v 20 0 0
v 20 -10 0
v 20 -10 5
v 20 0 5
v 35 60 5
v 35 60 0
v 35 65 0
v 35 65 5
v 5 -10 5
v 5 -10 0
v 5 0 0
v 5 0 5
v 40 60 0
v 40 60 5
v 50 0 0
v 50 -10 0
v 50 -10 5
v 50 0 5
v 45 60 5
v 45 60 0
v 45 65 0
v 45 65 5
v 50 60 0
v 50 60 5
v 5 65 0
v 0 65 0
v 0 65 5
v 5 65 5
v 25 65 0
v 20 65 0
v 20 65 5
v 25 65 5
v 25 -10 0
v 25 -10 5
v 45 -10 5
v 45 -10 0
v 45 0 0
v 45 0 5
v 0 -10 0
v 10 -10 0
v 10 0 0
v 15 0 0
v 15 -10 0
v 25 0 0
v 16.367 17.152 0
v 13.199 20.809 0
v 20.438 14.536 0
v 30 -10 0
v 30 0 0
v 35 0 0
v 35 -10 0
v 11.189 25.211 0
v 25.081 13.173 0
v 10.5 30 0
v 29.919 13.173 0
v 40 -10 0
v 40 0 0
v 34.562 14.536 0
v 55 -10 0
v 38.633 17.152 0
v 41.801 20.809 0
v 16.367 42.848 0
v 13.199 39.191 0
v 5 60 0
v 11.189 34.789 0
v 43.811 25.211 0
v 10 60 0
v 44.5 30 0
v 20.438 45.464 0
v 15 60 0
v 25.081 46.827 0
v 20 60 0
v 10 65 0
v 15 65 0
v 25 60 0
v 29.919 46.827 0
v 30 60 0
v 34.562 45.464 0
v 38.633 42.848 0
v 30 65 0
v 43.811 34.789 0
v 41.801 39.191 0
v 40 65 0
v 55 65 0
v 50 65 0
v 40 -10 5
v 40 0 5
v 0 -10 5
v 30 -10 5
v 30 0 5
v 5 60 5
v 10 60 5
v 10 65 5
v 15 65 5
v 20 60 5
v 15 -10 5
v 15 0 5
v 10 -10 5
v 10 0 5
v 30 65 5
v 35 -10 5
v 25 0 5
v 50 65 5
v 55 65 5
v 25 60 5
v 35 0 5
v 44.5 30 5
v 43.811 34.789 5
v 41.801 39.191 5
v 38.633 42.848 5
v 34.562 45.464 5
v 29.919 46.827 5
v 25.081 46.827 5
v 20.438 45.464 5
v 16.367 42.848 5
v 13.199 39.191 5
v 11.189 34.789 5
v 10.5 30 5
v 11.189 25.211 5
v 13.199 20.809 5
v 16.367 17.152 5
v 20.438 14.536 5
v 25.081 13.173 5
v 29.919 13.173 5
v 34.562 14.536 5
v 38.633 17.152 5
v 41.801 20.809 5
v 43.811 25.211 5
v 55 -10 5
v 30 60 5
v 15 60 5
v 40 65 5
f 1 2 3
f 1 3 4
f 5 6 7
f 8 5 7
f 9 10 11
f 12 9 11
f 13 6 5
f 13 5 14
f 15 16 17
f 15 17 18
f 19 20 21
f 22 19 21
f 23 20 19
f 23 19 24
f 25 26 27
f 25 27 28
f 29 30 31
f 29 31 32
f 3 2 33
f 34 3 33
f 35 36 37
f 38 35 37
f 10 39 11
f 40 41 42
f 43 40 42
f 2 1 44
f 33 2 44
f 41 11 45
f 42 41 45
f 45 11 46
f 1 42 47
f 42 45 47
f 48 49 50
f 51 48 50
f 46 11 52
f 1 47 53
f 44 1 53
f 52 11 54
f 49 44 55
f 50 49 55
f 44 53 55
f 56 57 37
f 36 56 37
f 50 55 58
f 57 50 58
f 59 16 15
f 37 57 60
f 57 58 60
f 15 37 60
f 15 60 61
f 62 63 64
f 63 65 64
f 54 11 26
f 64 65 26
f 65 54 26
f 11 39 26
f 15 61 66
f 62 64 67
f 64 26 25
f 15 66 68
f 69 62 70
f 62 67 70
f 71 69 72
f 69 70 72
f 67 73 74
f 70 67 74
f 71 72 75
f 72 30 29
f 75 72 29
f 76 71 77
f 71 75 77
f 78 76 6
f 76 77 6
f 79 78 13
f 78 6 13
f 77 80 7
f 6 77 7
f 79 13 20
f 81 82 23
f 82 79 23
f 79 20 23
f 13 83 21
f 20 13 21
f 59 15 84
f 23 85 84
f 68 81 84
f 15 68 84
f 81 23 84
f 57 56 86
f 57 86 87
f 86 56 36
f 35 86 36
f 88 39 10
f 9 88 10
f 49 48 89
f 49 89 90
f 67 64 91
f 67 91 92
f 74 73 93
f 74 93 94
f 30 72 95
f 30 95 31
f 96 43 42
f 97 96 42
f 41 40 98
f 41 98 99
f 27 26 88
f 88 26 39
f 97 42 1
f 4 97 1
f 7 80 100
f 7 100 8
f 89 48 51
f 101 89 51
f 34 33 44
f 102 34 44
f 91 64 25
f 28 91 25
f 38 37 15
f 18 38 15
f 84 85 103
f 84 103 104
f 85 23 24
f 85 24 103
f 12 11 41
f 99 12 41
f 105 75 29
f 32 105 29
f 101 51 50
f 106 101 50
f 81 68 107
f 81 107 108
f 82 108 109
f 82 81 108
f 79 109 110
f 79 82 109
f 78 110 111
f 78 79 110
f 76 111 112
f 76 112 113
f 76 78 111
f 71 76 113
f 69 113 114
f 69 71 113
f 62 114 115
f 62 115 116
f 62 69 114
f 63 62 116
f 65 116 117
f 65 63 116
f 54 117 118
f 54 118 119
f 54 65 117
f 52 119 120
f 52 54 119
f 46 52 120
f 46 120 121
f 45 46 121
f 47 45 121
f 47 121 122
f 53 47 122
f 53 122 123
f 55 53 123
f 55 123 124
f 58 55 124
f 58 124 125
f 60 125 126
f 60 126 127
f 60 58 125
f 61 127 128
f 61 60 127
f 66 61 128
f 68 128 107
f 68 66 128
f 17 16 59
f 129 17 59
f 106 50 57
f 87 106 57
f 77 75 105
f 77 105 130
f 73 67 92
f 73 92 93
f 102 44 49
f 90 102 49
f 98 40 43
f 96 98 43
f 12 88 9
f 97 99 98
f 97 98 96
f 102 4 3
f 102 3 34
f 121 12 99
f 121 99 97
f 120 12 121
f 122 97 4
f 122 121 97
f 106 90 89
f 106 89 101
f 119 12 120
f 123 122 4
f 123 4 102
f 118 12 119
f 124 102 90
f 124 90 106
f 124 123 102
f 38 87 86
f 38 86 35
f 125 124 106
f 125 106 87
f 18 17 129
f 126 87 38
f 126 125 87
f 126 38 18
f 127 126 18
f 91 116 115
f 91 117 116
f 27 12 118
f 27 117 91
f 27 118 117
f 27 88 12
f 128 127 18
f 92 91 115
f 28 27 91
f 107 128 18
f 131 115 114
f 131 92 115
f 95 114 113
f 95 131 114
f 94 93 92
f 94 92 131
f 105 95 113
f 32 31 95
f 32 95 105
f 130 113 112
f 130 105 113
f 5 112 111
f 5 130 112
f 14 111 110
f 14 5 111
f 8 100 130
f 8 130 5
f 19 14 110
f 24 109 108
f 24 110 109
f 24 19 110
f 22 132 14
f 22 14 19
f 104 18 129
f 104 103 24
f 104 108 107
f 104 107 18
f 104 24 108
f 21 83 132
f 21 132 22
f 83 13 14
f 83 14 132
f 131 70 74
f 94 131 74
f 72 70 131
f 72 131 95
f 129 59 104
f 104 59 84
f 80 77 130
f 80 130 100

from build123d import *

# Parameters (mm, degrees)
ESQUISSE1_W        = 55
ESQUISSE1_H        = 60
ESQUISSE1_R        = 17
ESQUISSE1_W_2      = 5
ESQUISSE1_H_2      = 5
ESQUISSE1_H_3      = 10
BOSS_EXTRU_1_DEPTH = 5


with BuildPart() as part:
    # Esquisse1 → Boss.-Extru.1 (new body)
    with BuildSketch(Plane.XY):
        with Locations((27.5, 30)):
            Rectangle(ESQUISSE1_W, ESQUISSE1_H)
        with Locations((27.5, 30)):
            Circle(ESQUISSE1_R, mode=Mode.SUBTRACT)
        with Locations((12.5, 62.5)):
            Rectangle(ESQUISSE1_W_2, ESQUISSE1_H_2)
        with Locations((2.5, 62.5)):
            Rectangle(ESQUISSE1_W_2, ESQUISSE1_H_2)
        with Locations((22.5, 62.5)):
            Rectangle(ESQUISSE1_W_2, ESQUISSE1_H_2)
        with Locations((32.5, 62.5)):
            Rectangle(ESQUISSE1_W_2, ESQUISSE1_H_2)
        with Locations((52.5, 62.5)):
            Rectangle(ESQUISSE1_W_2, ESQUISSE1_H_2)
        with Locations((42.5, 62.5)):
            Rectangle(ESQUISSE1_W_2, ESQUISSE1_H_2)
        with Locations((2.5, -5)):
            Rectangle(ESQUISSE1_W_2, ESQUISSE1_H_3)
        with Locations((12.5, -5)):
            Rectangle(ESQUISSE1_W_2, ESQUISSE1_H_3)
        with Locations((22.5, -5)):
            Rectangle(ESQUISSE1_W_2, ESQUISSE1_H_3)
        with Locations((32.5, -5)):
            Rectangle(ESQUISSE1_W_2, ESQUISSE1_H_3)
        with Locations((42.5, -5)):
            Rectangle(ESQUISSE1_W_2, ESQUISSE1_H_3)
        with Locations((52.5, -5)):
            Rectangle(ESQUISSE1_W_2, ESQUISSE1_H_3)
    extrude(amount=BOSS_EXTRU_1_DEPTH)


solid = part.part
